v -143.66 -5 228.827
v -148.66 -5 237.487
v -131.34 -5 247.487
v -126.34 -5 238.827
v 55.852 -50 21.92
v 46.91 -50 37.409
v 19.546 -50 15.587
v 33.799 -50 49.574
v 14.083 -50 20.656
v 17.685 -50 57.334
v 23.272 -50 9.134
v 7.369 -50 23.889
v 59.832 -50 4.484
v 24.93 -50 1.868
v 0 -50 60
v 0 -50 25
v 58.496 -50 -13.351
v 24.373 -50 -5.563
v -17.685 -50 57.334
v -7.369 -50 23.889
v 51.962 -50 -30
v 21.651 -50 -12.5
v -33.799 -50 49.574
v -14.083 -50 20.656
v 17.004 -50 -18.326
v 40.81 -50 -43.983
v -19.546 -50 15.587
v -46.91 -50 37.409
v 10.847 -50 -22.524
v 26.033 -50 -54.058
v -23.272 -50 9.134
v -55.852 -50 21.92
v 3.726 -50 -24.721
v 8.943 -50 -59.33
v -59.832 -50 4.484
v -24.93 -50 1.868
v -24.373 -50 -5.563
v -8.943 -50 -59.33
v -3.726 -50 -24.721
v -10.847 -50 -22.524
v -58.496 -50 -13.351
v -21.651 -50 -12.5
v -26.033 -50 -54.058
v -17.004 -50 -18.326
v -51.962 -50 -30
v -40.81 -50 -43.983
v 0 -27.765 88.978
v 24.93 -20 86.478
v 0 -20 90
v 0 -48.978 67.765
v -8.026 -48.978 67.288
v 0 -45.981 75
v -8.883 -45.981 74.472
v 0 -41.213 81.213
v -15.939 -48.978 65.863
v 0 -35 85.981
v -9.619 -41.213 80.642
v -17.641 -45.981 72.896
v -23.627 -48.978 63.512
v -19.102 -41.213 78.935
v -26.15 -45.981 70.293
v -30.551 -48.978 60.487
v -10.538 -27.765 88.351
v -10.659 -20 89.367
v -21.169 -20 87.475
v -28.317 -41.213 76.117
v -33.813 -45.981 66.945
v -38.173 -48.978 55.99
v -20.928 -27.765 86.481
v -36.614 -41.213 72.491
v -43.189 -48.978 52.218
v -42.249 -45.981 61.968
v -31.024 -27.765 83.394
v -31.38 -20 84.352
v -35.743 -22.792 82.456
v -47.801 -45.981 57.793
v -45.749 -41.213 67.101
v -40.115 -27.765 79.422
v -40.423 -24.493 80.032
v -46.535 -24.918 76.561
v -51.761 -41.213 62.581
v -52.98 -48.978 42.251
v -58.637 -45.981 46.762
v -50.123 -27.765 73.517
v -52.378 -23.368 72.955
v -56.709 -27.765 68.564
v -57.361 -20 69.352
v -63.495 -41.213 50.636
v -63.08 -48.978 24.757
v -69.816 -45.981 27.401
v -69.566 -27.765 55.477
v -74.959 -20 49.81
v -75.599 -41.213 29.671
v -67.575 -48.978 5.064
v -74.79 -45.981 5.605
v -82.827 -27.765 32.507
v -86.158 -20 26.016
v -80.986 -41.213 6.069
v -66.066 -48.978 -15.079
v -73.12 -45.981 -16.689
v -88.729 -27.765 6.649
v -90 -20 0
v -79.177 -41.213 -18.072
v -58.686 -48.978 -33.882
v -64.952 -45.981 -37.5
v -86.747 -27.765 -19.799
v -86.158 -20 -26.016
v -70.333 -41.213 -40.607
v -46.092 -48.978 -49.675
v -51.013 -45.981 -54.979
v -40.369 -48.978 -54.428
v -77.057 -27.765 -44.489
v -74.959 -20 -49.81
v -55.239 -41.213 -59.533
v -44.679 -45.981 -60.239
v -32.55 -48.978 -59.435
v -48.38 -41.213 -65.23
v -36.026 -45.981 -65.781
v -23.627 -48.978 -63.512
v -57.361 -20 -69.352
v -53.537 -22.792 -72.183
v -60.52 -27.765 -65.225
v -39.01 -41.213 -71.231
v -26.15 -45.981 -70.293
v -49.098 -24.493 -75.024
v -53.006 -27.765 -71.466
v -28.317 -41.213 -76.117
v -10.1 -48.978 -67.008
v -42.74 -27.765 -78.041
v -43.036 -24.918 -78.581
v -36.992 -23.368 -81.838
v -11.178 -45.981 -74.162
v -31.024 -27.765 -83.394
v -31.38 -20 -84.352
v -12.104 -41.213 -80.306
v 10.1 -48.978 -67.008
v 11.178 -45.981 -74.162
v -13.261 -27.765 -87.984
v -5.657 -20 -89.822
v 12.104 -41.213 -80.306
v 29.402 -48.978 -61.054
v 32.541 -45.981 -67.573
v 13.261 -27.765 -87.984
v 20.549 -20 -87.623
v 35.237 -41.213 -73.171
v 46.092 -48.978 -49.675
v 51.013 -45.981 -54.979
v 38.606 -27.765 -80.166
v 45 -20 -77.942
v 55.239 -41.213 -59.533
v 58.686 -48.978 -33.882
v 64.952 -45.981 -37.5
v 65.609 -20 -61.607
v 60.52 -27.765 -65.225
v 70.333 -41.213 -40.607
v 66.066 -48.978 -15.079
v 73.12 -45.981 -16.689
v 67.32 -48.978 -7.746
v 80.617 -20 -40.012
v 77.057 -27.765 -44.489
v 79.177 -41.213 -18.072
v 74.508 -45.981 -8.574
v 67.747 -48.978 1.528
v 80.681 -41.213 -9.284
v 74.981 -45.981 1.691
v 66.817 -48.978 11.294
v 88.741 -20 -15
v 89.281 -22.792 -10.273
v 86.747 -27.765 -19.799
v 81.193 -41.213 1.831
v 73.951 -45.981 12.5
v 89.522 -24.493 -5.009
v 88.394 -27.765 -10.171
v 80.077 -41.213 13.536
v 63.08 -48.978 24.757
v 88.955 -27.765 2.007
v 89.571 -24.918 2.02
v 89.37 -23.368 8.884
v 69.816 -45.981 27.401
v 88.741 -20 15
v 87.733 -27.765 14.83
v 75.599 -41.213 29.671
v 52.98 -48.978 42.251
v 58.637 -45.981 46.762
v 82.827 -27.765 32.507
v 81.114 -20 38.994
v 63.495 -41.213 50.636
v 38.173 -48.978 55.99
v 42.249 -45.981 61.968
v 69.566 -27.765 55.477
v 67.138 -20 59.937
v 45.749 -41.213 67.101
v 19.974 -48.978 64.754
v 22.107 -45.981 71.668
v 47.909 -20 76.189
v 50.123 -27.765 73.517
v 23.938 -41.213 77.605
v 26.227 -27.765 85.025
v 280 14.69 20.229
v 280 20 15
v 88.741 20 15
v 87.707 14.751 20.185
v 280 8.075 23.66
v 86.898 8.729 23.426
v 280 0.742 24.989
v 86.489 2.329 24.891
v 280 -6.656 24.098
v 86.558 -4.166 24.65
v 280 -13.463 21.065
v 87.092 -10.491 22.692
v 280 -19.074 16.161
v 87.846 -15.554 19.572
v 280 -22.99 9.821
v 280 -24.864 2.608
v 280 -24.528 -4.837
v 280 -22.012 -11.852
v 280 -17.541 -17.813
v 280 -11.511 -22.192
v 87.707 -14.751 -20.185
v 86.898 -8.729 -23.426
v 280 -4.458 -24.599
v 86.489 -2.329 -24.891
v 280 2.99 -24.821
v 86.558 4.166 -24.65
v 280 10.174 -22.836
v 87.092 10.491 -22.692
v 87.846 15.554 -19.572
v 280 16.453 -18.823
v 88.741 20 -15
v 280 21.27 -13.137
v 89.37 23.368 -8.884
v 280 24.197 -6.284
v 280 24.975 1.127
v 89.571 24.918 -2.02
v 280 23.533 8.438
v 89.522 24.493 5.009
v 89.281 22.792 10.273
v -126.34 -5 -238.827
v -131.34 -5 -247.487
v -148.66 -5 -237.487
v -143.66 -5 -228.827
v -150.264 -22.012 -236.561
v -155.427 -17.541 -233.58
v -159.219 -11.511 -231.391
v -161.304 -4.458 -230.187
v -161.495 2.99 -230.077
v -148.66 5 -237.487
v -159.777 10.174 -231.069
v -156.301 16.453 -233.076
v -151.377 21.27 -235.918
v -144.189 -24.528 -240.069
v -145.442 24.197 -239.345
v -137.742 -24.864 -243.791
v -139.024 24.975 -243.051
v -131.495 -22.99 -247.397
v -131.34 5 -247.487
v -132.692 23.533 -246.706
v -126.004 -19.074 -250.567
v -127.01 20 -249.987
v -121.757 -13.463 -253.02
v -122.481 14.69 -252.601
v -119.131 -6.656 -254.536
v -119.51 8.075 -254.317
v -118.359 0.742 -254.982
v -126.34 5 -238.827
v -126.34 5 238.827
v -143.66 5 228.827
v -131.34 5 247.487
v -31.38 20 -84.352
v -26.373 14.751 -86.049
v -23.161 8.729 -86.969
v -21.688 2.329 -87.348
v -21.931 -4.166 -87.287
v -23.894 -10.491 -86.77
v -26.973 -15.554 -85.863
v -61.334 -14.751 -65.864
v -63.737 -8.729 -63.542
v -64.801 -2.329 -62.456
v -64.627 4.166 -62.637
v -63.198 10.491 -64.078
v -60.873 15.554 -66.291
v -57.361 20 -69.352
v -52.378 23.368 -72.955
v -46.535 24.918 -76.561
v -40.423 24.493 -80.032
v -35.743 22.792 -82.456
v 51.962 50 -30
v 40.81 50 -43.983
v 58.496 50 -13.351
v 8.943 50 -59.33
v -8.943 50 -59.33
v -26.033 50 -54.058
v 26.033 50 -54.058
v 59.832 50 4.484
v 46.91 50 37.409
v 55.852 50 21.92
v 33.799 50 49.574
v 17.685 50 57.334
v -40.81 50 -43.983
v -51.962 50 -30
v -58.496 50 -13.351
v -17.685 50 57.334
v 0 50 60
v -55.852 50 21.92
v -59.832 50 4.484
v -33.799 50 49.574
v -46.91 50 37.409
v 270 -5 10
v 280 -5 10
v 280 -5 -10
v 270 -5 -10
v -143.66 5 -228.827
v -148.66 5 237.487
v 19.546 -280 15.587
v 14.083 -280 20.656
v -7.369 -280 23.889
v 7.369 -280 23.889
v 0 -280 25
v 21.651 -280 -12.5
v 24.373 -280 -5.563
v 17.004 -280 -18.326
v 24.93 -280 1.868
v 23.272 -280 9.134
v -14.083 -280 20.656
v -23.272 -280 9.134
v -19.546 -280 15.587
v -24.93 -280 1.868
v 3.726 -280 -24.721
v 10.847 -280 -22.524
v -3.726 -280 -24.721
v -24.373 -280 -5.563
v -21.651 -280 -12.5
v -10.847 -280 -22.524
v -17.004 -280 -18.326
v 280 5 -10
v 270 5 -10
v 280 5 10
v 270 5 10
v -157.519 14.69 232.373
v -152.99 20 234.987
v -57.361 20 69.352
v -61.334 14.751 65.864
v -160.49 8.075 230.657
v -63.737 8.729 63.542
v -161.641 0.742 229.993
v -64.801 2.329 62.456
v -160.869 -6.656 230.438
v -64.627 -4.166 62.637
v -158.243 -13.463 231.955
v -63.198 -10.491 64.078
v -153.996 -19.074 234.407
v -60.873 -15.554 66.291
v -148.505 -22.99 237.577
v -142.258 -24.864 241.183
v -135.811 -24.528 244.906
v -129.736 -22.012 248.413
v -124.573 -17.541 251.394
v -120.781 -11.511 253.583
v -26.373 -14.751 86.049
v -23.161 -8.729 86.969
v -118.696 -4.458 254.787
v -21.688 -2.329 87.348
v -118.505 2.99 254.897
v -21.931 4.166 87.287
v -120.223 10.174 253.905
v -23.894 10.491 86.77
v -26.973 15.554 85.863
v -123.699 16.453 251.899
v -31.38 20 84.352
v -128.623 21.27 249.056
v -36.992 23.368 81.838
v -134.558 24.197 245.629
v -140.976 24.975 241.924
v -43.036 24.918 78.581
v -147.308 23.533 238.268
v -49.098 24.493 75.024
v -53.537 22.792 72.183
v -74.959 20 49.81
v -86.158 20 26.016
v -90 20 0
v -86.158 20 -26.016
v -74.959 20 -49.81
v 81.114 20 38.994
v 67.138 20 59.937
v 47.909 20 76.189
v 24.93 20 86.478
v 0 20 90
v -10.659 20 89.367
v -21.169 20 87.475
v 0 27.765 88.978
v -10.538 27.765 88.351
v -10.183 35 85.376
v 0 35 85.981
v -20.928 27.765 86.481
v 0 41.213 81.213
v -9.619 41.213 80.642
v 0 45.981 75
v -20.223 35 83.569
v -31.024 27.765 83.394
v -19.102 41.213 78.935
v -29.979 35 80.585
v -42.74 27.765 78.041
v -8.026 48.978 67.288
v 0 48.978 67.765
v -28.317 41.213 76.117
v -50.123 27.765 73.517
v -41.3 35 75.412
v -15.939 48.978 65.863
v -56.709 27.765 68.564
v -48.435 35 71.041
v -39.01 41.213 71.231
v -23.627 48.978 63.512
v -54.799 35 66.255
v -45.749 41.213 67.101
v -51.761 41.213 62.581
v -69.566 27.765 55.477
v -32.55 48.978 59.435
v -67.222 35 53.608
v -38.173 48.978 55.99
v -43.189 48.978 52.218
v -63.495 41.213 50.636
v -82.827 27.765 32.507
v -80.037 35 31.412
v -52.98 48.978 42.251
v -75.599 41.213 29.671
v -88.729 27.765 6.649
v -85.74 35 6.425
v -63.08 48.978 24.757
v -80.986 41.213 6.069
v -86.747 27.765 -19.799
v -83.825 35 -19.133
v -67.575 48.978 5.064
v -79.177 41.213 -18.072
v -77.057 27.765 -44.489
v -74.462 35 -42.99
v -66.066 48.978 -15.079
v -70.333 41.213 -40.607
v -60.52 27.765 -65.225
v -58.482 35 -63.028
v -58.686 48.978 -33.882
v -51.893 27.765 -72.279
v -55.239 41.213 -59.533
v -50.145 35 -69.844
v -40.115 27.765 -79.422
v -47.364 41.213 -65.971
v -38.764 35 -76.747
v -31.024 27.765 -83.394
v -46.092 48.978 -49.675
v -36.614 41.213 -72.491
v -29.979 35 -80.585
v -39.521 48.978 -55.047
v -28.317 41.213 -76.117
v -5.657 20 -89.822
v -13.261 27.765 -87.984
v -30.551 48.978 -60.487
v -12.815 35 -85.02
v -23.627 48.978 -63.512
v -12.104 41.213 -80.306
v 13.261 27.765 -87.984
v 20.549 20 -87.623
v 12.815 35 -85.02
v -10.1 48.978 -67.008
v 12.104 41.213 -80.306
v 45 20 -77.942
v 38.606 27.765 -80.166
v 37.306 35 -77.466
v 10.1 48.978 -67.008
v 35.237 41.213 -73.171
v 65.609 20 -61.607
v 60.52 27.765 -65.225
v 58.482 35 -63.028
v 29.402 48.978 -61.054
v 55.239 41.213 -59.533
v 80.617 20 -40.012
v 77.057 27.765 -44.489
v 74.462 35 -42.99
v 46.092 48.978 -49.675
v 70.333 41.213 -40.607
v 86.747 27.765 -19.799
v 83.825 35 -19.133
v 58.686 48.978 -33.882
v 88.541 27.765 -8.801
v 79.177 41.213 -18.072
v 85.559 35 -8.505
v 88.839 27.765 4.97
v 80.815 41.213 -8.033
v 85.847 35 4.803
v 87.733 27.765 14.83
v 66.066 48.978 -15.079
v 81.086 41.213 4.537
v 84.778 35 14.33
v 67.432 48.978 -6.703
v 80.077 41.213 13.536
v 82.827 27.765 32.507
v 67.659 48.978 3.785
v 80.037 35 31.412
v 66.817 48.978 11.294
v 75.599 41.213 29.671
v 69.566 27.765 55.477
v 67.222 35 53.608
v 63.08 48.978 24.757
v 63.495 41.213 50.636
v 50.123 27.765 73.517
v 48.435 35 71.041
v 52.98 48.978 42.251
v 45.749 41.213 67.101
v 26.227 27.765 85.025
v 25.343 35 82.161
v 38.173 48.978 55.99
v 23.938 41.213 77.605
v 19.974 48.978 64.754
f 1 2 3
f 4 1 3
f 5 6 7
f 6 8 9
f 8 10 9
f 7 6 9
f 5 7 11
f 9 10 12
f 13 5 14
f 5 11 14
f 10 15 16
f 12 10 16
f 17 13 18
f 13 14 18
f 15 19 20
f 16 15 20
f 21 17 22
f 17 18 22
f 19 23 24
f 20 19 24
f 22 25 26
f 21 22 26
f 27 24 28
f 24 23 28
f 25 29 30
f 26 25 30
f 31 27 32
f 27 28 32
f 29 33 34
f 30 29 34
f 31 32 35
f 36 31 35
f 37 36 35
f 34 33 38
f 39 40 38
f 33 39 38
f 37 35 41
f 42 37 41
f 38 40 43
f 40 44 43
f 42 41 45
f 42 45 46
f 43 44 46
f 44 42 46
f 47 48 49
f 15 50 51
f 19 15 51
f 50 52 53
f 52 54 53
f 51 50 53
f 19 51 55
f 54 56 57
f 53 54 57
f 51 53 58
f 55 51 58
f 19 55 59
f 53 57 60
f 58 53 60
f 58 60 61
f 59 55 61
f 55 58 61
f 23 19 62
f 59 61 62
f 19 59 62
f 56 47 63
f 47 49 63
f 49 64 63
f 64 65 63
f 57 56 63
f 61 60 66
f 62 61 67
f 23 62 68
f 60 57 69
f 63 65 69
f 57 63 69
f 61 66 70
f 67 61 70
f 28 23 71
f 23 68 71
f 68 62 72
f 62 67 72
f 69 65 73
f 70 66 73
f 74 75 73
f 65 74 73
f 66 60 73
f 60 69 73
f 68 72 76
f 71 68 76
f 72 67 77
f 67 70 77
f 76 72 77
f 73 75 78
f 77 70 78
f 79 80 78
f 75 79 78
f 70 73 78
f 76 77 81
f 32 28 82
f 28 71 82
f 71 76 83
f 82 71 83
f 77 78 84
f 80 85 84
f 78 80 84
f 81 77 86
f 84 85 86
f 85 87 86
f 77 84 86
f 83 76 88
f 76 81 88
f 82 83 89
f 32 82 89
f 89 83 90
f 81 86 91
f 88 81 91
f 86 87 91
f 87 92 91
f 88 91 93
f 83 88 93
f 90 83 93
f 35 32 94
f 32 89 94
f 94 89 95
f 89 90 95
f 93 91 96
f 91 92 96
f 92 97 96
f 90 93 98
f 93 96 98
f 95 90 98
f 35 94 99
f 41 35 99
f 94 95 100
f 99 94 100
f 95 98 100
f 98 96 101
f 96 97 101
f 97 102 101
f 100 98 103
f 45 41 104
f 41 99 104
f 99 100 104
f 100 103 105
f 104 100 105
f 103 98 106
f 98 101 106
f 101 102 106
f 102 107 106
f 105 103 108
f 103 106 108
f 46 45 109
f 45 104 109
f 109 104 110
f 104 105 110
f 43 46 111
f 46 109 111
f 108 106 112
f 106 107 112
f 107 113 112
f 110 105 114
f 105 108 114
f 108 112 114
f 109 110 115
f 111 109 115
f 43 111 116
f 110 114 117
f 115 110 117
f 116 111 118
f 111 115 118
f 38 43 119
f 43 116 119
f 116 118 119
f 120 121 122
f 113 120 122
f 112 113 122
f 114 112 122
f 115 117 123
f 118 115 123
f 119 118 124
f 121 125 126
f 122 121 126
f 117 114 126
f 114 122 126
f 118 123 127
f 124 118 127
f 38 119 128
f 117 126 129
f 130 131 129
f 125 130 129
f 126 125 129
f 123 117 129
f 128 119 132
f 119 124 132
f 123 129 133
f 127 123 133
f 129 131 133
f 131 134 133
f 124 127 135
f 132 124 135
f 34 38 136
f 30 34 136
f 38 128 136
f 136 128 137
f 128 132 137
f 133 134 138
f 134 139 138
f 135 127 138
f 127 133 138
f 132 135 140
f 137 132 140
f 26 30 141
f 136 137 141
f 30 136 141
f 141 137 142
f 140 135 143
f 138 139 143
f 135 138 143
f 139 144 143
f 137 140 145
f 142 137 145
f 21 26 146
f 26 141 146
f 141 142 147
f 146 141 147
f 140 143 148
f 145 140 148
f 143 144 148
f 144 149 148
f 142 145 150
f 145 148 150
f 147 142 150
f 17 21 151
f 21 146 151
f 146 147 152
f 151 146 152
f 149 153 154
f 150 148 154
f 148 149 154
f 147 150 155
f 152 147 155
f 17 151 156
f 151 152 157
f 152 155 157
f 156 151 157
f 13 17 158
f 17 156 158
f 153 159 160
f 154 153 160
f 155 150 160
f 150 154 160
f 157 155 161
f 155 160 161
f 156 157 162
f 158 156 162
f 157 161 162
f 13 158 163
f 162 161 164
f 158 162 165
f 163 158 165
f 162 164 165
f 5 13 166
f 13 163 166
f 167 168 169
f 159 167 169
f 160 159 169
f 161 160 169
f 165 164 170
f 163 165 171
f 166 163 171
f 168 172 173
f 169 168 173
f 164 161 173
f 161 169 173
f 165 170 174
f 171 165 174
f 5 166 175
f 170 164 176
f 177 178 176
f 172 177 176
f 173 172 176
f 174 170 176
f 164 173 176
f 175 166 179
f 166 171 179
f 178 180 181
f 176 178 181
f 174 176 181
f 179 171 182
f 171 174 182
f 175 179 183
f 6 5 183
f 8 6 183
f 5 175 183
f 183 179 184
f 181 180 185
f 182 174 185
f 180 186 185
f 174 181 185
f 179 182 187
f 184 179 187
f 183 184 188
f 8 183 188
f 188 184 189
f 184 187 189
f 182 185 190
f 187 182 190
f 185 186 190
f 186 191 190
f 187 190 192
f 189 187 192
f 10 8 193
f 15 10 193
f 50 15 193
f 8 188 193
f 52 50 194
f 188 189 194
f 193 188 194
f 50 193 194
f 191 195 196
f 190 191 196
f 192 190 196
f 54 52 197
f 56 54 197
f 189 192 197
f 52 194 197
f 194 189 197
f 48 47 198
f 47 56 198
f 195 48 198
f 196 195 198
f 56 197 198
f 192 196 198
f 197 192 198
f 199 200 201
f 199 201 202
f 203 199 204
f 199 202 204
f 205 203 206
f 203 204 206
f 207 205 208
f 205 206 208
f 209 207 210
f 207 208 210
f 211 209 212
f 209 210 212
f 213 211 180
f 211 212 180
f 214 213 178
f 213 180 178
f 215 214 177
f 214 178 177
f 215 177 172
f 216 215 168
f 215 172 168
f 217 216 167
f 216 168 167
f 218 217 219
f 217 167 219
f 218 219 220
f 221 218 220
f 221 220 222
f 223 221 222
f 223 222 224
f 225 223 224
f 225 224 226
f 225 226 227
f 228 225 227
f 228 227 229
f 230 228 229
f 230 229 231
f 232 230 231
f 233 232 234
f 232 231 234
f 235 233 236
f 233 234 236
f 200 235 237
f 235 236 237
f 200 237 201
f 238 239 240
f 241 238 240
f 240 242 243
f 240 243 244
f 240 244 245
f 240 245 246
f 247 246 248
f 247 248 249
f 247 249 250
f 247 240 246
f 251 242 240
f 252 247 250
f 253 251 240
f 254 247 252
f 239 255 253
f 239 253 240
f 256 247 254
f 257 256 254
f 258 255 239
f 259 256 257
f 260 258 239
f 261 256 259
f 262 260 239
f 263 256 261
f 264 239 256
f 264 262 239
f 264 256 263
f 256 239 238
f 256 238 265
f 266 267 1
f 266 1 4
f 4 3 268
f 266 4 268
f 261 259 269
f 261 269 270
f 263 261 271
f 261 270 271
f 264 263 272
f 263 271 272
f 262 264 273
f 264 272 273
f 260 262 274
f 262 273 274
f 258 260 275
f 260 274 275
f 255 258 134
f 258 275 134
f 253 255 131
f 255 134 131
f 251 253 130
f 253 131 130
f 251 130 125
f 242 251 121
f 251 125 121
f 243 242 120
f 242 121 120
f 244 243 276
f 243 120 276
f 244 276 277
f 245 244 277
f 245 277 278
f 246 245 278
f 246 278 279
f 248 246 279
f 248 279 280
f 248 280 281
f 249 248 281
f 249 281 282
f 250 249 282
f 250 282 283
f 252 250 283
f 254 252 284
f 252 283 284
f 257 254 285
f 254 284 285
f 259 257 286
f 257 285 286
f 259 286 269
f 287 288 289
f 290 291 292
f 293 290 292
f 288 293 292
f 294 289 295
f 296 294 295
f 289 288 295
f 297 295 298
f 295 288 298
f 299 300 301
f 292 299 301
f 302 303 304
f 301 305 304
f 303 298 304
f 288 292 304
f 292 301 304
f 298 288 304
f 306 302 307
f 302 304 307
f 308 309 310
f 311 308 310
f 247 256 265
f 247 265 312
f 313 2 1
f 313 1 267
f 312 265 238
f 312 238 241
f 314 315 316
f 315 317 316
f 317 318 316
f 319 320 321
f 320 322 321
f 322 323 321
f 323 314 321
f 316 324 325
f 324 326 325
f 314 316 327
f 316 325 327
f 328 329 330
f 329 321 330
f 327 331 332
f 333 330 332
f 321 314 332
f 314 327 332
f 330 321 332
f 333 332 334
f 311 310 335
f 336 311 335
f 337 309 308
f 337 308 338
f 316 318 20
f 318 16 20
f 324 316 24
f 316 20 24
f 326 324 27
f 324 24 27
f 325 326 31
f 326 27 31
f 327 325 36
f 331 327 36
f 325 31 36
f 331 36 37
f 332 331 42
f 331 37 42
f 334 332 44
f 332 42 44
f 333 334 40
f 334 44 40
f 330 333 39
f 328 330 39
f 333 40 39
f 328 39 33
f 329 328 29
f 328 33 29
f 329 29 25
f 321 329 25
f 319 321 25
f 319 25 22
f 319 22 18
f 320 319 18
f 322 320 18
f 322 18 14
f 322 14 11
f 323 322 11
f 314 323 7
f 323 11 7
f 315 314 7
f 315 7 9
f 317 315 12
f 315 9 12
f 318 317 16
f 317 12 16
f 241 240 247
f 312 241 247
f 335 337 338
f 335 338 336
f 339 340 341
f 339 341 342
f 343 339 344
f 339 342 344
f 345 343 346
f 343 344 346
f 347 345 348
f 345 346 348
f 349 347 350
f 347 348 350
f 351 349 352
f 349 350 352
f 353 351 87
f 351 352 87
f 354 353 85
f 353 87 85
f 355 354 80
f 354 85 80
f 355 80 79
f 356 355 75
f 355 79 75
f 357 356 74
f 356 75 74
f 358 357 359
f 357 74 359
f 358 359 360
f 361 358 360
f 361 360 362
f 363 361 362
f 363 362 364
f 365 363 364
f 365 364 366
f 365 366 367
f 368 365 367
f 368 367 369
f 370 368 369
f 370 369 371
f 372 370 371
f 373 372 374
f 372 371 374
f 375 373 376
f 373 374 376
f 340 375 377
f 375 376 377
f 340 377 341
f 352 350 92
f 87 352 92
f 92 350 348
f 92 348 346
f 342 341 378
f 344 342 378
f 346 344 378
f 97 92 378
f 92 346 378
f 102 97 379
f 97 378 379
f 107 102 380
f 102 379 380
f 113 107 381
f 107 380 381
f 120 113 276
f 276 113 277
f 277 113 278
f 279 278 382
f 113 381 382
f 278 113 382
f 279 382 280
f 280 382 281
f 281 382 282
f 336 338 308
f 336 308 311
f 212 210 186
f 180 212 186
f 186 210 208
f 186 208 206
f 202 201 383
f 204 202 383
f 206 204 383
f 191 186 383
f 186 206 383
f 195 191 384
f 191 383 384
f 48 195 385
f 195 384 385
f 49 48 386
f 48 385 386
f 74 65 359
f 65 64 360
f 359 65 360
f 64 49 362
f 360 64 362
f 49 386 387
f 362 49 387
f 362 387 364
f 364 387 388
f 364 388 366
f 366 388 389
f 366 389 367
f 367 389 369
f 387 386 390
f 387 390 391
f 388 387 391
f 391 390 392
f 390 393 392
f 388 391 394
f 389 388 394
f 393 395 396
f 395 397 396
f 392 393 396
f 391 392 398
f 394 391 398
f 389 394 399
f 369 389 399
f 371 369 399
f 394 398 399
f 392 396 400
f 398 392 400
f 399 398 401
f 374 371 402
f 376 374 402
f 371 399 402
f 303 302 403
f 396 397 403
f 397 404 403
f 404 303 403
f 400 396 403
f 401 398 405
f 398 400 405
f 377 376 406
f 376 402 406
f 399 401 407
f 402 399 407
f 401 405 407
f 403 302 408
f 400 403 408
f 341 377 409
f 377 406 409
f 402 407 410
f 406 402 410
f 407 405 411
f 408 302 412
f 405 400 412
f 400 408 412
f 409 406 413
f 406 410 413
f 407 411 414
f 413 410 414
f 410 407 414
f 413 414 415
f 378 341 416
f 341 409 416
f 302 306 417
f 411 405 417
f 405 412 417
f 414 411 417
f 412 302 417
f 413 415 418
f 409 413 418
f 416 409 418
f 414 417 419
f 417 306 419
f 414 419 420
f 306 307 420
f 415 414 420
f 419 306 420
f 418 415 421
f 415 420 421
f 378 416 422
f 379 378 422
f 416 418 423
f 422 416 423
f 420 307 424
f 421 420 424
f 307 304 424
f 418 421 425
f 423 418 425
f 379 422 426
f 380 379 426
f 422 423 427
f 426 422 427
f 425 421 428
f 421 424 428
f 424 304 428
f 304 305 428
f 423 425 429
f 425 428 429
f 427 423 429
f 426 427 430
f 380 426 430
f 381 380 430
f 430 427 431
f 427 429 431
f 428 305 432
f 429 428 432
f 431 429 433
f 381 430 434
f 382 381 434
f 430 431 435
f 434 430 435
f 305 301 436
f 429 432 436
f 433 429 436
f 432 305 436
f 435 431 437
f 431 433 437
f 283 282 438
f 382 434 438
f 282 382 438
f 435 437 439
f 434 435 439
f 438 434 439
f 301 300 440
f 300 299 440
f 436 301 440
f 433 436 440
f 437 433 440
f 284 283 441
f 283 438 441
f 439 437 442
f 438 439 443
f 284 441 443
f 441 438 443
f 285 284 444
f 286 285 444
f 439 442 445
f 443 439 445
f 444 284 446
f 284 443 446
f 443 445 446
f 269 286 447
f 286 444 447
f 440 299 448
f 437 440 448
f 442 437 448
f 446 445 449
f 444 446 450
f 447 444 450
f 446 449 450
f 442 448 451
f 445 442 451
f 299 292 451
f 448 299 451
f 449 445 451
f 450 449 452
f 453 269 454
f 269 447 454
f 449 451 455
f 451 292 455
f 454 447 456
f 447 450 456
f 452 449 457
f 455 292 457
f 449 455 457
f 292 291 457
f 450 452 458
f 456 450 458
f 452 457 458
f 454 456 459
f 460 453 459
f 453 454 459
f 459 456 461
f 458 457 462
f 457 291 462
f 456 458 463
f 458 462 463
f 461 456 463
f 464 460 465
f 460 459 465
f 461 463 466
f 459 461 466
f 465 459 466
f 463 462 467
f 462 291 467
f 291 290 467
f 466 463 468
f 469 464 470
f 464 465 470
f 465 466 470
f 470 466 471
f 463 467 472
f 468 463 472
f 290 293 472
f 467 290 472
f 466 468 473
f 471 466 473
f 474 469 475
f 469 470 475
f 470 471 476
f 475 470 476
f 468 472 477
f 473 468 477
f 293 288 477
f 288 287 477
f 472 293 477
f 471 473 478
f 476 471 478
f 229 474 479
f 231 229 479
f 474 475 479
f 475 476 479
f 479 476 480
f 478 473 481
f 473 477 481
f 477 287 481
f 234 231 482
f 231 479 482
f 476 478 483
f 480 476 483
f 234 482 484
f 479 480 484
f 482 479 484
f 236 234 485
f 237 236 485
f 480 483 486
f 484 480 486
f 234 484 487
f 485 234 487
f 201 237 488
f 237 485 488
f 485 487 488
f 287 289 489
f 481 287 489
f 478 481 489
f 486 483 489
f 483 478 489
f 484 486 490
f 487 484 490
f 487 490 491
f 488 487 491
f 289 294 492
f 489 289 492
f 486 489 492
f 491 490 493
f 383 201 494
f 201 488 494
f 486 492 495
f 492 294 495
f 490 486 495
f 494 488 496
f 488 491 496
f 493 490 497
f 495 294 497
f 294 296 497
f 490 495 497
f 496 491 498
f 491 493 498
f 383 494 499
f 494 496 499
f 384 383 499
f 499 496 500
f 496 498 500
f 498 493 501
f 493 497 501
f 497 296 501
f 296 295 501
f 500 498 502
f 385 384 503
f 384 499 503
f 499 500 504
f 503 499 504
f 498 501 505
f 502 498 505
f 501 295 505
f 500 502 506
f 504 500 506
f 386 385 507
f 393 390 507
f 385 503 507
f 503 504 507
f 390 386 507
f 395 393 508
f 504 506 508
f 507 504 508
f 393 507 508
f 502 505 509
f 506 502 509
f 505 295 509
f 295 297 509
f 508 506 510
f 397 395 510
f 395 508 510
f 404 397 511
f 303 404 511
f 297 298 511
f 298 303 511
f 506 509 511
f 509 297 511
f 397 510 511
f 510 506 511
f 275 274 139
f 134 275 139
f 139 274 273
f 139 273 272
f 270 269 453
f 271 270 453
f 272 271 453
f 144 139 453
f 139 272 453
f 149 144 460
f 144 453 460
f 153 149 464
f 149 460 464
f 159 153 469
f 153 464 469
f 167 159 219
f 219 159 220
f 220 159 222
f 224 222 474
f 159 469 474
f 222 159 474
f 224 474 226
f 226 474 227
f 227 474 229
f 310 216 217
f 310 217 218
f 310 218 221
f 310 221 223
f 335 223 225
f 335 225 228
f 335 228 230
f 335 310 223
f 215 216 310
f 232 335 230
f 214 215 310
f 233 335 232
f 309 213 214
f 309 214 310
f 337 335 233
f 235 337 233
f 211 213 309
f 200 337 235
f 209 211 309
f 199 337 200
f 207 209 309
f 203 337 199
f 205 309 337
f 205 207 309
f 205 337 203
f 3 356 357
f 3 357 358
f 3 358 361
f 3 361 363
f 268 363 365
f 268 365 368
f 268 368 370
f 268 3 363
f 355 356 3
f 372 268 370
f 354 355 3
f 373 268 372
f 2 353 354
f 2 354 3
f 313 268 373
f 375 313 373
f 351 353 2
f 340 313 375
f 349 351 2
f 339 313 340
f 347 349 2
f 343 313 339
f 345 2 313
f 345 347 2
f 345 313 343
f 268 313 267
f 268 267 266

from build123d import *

# Parameters (mm, degrees)
SKETCH_1_W               = 25
SKETCH_1_H               = 230
SKETCH_5_R               = 25
EXTRUDE_1_DEPTH          = 280
PATTERN_CIRCULAR_1_COUNT = 3
SKETCH_7_W               = 20
SKETCH_7_H               = 10
CUT_EXTRUDE_2_DEPTH      = 10
PATTERN_CIRCULAR_2_COUNT = 3


with BuildPart() as part:
    # 草图1 → 旋转1 (revolve)
    with BuildSketch(Plane.XY, mode=Mode.PRIVATE) as revolve_1_sk:
        with BuildLine():
            Line((90, -20), (90, 20))
            ThreePointArc((90, 20), (81.213203436, 41.213203436), (60, 50))
            Line((60, 50), (0, 50))
            Line((0, 50), (0, -50))
            Line((0, -50), (60, -50))
            ThreePointArc((60, -50), (81.213203436, -41.213203436), (90, -20))
        make_face()
        with Locations((12.5, -165)):
            Rectangle(SKETCH_1_W, SKETCH_1_H)
    revolve(revolve_1_sk.sketch.rotate(Axis((0, 124, 0), (0, -1, 0)), 90), axis=Axis((0, 124, 0), (0, -1, 0)))

    # 草图5 → 凸台-拉伸1 (add)
    with BuildSketch(Plane(origin=(0, 0, 0), x_dir=(0, 0, -1), z_dir=(1, 0, 0))):
        with Locations(Location((0, 0, 0), (0, 0, 126.869897646))):
            Circle(SKETCH_5_R)
    extrude_1 = extrude(amount=EXTRUDE_1_DEPTH)

    # 阵列(圆周)1: 凸台-拉伸1 ×3 about axis
    pattern_circular_1_axis = Axis((0, 0, 0), (0, 1, 0))
    for i in range(1, PATTERN_CIRCULAR_1_COUNT):
        add(extrude_1.rotate(pattern_circular_1_axis, i * 360 / PATTERN_CIRCULAR_1_COUNT))

    # 草图7 → 切除-拉伸2 (cut)
    with BuildSketch(Plane(origin=(280, 0, 0), x_dir=(0, 0, -1), z_dir=(1, 0, 0))):
        Rectangle(SKETCH_7_W, SKETCH_7_H)
    cut_extrude_2 = extrude(amount=-CUT_EXTRUDE_2_DEPTH, mode=Mode.SUBTRACT)

    # 阵列(圆周)2: 切除-拉伸2 ×3 about axis
    pattern_circular_2_axis = Axis((0, 0, 0), (0, 1, 0))
    for i in range(1, PATTERN_CIRCULAR_2_COUNT):
        add(cut_extrude_2.rotate(pattern_circular_2_axis, i * 360 / PATTERN_CIRCULAR_2_COUNT), mode=Mode.SUBTRACT)


solid = part.part
